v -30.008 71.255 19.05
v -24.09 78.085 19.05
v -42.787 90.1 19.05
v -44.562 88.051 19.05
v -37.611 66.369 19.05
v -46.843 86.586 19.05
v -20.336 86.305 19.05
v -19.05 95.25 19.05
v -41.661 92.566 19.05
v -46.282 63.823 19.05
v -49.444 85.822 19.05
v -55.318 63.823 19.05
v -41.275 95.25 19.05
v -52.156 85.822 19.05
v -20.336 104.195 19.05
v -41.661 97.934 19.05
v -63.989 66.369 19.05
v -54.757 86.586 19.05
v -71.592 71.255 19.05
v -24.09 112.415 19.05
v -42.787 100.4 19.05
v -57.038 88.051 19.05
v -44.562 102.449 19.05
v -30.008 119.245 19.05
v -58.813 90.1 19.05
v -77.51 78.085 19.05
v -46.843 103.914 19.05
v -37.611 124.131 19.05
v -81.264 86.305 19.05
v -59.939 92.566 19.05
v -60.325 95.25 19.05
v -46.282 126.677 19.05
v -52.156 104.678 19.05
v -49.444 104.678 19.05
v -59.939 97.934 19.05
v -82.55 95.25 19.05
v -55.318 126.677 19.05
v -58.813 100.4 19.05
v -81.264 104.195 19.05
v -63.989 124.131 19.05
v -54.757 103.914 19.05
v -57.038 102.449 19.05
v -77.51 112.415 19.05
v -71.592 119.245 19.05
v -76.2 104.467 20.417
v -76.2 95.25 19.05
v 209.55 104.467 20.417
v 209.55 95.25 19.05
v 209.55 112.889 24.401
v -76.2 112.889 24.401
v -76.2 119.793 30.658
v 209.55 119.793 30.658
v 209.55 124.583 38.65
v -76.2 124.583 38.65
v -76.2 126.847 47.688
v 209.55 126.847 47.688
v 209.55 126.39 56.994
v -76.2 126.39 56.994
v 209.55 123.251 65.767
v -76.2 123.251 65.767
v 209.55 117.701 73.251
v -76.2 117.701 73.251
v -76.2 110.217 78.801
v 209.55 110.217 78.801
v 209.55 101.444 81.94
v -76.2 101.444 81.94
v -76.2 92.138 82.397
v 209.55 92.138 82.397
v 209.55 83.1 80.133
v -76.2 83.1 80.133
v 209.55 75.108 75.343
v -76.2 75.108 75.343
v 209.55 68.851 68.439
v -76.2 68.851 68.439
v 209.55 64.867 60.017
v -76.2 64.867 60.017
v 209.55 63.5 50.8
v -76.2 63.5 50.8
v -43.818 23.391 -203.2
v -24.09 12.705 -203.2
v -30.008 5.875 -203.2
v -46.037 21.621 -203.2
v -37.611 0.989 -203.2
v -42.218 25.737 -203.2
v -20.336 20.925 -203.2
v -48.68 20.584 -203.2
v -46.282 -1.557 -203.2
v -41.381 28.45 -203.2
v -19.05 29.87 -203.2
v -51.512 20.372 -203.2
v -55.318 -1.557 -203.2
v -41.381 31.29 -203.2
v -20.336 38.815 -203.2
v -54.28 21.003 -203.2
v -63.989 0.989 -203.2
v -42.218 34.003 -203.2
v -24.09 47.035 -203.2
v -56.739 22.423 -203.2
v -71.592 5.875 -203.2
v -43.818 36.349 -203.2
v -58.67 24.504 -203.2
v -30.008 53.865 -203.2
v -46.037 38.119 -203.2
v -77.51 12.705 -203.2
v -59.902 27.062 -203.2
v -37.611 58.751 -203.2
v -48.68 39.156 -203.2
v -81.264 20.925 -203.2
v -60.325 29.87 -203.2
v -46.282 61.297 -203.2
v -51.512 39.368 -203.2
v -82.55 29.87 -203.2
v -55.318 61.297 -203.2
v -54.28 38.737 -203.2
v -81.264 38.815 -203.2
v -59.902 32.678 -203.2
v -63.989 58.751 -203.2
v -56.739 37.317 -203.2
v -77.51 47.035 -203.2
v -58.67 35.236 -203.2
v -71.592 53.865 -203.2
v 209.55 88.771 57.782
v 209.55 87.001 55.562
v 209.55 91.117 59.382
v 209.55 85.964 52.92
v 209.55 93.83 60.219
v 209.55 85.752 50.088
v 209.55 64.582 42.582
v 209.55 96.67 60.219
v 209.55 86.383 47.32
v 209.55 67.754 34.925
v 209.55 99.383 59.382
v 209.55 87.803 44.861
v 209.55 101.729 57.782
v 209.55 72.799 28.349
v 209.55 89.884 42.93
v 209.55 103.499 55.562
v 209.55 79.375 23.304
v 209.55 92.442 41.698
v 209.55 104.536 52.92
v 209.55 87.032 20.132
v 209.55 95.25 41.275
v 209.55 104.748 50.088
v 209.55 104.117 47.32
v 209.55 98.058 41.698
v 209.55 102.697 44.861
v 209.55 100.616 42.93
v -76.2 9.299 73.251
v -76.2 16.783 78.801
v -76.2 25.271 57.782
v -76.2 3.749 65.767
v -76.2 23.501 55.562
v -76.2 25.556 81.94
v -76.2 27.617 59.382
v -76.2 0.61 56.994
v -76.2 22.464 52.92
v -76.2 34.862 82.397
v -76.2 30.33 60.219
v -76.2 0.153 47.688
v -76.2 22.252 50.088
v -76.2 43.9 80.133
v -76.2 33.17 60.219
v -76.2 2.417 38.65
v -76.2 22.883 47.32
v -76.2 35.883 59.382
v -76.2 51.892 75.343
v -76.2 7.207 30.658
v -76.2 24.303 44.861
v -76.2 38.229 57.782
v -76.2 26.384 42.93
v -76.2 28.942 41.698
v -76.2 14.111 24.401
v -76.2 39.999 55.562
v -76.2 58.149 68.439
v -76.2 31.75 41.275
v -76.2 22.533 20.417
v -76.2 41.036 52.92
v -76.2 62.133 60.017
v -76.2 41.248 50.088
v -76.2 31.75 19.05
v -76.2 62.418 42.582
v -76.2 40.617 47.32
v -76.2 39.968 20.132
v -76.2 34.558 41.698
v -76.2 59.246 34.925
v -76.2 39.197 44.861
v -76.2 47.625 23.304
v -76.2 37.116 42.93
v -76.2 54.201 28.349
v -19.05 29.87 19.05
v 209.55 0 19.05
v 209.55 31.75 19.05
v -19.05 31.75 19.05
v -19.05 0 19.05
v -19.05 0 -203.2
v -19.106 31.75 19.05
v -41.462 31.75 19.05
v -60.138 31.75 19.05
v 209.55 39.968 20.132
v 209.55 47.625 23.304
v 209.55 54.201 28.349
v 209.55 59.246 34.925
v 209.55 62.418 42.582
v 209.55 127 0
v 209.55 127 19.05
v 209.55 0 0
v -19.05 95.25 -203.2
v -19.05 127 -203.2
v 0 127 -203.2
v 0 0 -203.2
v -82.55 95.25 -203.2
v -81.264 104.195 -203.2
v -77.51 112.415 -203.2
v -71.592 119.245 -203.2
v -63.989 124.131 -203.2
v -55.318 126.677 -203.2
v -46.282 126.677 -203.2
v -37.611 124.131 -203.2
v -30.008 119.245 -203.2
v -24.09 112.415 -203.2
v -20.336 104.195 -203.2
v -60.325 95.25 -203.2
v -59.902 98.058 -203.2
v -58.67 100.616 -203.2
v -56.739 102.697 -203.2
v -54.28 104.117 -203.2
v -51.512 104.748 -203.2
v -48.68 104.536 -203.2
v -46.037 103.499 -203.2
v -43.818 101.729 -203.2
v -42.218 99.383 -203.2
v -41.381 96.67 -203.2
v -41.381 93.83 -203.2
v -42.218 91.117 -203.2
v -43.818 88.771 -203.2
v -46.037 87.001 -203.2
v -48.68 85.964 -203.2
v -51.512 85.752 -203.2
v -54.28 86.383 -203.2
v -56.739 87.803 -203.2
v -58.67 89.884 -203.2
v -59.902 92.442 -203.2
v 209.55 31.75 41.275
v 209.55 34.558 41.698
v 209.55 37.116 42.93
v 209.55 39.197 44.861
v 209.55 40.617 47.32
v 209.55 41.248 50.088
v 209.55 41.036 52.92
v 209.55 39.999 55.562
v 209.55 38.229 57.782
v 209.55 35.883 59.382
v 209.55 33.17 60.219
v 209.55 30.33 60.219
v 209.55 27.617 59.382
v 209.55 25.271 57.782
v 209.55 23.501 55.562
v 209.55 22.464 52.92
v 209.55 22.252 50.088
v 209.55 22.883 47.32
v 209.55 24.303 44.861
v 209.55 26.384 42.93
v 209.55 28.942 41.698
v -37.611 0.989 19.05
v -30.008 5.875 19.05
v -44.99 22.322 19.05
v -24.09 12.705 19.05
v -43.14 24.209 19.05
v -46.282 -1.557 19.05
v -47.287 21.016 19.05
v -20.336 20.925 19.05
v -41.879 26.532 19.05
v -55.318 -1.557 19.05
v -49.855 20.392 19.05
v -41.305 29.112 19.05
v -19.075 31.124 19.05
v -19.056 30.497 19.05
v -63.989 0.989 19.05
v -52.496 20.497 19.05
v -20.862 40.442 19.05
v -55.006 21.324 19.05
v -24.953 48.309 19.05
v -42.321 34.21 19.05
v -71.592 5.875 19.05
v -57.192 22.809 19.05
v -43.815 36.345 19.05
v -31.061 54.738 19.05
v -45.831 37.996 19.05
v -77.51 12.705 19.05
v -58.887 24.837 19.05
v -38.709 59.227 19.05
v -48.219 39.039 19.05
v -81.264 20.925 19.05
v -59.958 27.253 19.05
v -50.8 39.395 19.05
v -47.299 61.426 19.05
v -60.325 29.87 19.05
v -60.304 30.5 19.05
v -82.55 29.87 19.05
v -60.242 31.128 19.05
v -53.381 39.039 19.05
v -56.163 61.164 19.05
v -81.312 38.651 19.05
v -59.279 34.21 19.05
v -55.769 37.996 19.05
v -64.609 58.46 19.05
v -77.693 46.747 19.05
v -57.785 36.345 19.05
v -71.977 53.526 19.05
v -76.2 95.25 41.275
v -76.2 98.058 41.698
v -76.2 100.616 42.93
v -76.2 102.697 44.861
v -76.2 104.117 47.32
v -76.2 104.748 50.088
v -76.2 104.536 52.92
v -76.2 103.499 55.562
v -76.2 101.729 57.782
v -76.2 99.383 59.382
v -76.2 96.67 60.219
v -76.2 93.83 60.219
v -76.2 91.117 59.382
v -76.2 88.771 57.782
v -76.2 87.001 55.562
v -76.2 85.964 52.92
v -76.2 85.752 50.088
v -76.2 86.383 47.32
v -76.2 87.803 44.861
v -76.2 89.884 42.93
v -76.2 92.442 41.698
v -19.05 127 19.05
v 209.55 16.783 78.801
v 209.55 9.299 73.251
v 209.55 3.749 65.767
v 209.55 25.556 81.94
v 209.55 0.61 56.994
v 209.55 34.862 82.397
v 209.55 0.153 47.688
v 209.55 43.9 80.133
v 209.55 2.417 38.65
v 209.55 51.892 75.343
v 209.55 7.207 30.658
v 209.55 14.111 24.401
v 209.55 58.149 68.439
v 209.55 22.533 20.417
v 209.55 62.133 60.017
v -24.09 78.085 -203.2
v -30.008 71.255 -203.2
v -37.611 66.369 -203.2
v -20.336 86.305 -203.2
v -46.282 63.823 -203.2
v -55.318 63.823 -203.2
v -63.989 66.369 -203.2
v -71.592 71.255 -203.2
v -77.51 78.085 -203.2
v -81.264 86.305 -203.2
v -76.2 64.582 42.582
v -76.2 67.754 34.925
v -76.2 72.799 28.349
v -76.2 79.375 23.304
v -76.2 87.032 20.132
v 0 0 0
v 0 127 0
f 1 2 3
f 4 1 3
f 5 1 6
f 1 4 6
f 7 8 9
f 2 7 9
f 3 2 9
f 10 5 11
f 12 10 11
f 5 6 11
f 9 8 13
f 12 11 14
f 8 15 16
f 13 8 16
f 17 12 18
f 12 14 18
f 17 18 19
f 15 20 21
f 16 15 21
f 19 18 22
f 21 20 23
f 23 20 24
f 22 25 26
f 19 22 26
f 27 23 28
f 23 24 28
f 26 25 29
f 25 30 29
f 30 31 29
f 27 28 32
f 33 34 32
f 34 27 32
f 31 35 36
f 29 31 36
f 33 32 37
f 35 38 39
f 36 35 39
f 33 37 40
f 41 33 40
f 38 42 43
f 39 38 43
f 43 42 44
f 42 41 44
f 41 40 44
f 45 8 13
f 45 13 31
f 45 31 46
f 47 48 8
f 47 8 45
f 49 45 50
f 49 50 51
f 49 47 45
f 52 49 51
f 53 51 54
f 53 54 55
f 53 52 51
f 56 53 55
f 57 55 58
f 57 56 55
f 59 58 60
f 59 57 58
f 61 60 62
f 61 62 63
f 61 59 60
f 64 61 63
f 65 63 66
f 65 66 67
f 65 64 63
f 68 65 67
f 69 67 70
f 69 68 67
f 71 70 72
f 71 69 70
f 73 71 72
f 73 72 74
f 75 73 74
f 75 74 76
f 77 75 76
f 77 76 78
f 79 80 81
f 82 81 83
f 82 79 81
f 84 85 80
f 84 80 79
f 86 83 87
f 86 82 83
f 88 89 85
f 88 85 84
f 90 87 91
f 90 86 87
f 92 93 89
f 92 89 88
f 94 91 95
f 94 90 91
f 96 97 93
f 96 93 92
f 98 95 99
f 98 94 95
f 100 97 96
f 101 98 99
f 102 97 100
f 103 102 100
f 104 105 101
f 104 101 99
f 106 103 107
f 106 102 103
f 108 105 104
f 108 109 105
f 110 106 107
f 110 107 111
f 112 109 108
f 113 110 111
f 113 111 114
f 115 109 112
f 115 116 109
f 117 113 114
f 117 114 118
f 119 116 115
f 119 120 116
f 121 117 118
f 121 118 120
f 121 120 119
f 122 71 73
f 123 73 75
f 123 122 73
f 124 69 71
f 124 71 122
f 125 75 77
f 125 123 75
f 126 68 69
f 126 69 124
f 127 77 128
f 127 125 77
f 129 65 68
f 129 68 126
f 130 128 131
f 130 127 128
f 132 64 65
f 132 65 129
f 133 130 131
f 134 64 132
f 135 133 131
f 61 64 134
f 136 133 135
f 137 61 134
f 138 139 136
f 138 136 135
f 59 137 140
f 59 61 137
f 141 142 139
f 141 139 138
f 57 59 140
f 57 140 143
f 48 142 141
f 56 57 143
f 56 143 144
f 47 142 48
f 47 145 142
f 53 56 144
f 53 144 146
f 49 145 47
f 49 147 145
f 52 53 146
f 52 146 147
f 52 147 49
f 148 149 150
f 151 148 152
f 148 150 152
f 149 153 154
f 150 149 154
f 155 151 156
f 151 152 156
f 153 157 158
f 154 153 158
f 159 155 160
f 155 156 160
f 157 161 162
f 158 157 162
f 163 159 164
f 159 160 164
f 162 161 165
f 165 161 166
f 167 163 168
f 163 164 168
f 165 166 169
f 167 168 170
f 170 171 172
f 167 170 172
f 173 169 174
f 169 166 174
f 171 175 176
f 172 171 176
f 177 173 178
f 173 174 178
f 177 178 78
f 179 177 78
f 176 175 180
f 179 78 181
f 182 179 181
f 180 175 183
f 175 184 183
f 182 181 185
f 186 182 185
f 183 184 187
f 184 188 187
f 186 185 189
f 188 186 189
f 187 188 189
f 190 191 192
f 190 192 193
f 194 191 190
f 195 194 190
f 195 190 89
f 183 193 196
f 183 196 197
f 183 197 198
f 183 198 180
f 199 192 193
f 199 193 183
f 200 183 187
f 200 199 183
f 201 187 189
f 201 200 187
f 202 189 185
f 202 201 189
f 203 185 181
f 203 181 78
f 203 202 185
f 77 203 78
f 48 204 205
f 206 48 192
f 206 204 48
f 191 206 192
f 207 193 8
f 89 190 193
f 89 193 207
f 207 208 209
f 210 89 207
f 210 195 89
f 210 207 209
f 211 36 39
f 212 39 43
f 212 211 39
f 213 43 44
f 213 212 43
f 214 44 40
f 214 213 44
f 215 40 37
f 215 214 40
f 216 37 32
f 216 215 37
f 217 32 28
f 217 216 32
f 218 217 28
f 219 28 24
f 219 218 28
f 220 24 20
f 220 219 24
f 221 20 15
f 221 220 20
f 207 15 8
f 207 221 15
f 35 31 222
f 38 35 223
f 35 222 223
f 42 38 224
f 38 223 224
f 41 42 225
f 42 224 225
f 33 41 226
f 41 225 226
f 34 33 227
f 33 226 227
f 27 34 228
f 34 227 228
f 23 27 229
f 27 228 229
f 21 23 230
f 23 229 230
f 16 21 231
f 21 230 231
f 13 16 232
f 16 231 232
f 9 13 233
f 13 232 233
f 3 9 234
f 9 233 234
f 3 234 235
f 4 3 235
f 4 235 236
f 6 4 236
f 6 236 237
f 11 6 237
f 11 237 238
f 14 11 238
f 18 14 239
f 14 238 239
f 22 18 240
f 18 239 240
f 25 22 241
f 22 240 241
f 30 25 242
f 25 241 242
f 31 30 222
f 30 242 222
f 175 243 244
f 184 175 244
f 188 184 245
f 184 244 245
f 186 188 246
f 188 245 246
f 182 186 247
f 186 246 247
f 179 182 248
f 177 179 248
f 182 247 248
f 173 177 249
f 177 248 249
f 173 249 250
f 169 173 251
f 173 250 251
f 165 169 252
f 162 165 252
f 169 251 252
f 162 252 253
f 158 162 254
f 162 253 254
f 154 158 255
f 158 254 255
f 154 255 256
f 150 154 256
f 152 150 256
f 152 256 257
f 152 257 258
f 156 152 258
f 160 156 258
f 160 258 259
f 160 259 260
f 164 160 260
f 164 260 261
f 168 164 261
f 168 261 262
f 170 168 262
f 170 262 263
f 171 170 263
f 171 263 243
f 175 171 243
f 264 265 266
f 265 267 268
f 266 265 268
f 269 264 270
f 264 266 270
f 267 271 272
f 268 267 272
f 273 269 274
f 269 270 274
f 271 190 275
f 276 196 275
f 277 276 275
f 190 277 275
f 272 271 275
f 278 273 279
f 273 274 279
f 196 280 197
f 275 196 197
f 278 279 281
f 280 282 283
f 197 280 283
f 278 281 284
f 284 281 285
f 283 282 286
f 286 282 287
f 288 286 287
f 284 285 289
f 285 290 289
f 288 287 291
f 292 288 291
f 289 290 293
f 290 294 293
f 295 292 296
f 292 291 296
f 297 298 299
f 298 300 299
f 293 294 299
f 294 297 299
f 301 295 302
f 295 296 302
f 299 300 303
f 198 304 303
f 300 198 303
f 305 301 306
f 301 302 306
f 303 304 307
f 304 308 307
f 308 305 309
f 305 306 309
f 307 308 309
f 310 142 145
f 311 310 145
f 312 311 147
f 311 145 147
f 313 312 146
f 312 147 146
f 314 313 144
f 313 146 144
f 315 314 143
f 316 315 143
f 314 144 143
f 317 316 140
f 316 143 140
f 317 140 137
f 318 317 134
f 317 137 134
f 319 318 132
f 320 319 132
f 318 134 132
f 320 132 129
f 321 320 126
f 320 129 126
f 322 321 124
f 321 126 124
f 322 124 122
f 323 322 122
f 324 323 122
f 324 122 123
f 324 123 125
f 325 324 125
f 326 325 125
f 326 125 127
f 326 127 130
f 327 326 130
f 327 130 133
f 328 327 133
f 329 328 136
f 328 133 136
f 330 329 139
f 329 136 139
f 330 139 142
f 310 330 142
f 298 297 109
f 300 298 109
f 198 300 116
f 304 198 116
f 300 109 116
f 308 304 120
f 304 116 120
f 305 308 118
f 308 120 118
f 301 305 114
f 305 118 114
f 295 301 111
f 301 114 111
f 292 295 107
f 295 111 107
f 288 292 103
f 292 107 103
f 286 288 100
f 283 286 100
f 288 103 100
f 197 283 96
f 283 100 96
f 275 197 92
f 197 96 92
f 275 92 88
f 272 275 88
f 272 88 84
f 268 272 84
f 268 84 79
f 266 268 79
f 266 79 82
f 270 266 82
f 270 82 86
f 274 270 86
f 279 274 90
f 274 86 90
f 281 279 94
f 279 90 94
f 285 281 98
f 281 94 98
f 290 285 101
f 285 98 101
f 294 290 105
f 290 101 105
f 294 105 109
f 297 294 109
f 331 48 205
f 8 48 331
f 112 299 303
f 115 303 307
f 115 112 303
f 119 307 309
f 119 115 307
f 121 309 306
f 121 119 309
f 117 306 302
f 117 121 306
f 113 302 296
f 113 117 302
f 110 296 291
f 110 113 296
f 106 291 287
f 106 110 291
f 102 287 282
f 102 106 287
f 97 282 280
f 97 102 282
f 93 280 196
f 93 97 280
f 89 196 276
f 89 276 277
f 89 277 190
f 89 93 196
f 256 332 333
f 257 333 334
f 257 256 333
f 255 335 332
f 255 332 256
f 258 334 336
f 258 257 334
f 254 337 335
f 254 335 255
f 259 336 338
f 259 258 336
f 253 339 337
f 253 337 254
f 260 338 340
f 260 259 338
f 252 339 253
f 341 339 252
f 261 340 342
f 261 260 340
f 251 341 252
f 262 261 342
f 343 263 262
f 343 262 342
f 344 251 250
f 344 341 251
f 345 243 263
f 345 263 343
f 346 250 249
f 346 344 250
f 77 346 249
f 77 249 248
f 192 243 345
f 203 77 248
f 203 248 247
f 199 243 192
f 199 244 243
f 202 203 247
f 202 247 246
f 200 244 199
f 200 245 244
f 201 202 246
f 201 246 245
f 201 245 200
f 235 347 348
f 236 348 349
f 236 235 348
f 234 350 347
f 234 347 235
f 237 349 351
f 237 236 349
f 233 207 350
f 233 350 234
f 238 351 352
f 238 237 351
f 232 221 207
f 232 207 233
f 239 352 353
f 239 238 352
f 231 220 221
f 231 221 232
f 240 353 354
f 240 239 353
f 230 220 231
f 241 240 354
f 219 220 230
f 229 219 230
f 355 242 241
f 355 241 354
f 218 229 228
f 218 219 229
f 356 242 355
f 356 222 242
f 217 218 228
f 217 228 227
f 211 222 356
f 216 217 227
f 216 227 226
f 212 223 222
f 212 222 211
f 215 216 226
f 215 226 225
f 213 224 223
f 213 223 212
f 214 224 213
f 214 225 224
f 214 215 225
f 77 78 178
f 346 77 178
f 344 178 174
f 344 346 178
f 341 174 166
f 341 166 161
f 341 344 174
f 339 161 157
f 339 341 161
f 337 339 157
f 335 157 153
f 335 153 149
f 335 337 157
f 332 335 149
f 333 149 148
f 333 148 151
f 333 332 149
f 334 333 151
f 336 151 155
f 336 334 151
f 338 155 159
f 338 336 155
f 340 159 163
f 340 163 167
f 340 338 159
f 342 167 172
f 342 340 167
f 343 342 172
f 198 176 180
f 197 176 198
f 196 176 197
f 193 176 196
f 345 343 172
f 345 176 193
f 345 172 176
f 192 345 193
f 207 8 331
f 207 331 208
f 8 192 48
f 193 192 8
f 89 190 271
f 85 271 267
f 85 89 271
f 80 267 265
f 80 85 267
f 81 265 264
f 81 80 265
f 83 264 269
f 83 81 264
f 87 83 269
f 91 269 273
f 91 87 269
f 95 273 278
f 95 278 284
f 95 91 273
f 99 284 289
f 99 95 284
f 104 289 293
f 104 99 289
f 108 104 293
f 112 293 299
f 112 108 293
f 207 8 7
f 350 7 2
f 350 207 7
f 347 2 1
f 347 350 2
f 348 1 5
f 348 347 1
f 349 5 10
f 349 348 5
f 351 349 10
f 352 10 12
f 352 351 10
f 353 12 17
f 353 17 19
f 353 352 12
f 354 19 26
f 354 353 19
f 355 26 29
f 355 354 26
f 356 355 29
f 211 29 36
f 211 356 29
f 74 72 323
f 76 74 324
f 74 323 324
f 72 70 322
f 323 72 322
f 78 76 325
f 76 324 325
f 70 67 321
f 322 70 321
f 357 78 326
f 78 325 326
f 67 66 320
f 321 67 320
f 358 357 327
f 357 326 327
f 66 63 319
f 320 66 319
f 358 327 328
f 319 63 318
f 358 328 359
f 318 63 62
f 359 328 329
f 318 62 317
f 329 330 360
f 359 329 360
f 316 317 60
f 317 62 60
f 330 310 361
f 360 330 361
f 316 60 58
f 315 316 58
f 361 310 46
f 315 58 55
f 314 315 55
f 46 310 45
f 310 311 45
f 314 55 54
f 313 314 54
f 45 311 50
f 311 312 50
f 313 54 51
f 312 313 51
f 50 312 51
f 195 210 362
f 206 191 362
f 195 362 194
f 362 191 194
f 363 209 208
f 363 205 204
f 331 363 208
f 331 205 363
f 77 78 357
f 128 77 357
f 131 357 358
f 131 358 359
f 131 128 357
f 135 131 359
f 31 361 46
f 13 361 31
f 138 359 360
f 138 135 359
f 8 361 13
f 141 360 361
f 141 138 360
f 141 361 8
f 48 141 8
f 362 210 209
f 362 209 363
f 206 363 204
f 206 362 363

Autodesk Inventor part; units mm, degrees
ref_plane "YZ Plane" through (0, 0, 0) normal (1, 0, 0) x (0, 1, 0)
ref_plane "XZ Plane" through (0, 0, 0) normal (0, 1, 0) x (-1, 0, 0)
ref_plane "XY Plane" through (0, 0, 0) normal (0, 0, 1) x (1, 0, 0)
sketch "Sketch1" plane through (0, 0, 0) normal (0, 1, 0) x (-1, 0, 0)
  line L0 (0, 0) -> (19.05, 0)
  line L1 (19.05, 0) -> (19.05, -203.2)
  line L2 (19.05, -203.2) -> (0, -203.2)
  line L3 (0, -203.2) -> (0, 0)
  line L4 (19.05, 0) -> (-209.55, 0)
  line L5 (-209.55, 0) -> (-209.55, 19.05)
  line L6 (-209.55, 19.05) -> (19.05, 19.05)
  line L7 (19.05, 19.05) -> (19.05, 0)
  dimension "d0" = 19.05
  dimension "d1" = 203.2
  dimension "d2" = 228.6
extrude "Extrusion1" add sketch "Sketch1" along normal blind 127
sketch "Sketch2" plane through (209.55, 0, 19.05) normal (1, 0, 0) x (0, 0, -1)
  circle A0 centre (-31.75, 95.25) radius 31.75
  circle A1 centre (-31.75, 95.25) radius 9.525
  line L0 (0, 0) -> (0, 127) projected
  line L1 (222.25, 127) -> (0, 127) projected
  line L2 (21.2181, 127) -> (-100.8948, 127) construction
  circle A2 centre (-31.75, 31.75) radius 31.75
  circle A3 centre (-31.75, 31.75) radius 9.525
  point P0 (19.05, 0)
  dimension "d6" = 63.5
  dimension "d7" = 19.05
extrude "Extrusion2" add sketch "Sketch2" against normal blind 285.75 contours A0 | A2
sketch "Sketch3" plane through (0, 0, -203.2) normal (0, 0, -1) x (-1, 0, 0)
  circle A0 centre (50.8, 95.25) radius 31.75
  line L0 (-209.55, 127) -> (76.2, 127) projected
  line L1 (19.05, 0) -> (19.05, 127) projected
  line L2 (-209.55, 63.5) -> (76.2, 63.5) projected
  circle A1 centre (50.8, 95.25) radius 9.525
  circle A2 centre (50.8, 29.87) radius 31.75
  circle A3 centre (50.8, 29.87) radius 9.525
  point P0 (0, 0)
  dimension "d10" = 19.05
extrude "Extrusion3" add sketch "Sketch3" against normal blind 222.25 contours A0 | A2
properties part number "Corner Bumper"
